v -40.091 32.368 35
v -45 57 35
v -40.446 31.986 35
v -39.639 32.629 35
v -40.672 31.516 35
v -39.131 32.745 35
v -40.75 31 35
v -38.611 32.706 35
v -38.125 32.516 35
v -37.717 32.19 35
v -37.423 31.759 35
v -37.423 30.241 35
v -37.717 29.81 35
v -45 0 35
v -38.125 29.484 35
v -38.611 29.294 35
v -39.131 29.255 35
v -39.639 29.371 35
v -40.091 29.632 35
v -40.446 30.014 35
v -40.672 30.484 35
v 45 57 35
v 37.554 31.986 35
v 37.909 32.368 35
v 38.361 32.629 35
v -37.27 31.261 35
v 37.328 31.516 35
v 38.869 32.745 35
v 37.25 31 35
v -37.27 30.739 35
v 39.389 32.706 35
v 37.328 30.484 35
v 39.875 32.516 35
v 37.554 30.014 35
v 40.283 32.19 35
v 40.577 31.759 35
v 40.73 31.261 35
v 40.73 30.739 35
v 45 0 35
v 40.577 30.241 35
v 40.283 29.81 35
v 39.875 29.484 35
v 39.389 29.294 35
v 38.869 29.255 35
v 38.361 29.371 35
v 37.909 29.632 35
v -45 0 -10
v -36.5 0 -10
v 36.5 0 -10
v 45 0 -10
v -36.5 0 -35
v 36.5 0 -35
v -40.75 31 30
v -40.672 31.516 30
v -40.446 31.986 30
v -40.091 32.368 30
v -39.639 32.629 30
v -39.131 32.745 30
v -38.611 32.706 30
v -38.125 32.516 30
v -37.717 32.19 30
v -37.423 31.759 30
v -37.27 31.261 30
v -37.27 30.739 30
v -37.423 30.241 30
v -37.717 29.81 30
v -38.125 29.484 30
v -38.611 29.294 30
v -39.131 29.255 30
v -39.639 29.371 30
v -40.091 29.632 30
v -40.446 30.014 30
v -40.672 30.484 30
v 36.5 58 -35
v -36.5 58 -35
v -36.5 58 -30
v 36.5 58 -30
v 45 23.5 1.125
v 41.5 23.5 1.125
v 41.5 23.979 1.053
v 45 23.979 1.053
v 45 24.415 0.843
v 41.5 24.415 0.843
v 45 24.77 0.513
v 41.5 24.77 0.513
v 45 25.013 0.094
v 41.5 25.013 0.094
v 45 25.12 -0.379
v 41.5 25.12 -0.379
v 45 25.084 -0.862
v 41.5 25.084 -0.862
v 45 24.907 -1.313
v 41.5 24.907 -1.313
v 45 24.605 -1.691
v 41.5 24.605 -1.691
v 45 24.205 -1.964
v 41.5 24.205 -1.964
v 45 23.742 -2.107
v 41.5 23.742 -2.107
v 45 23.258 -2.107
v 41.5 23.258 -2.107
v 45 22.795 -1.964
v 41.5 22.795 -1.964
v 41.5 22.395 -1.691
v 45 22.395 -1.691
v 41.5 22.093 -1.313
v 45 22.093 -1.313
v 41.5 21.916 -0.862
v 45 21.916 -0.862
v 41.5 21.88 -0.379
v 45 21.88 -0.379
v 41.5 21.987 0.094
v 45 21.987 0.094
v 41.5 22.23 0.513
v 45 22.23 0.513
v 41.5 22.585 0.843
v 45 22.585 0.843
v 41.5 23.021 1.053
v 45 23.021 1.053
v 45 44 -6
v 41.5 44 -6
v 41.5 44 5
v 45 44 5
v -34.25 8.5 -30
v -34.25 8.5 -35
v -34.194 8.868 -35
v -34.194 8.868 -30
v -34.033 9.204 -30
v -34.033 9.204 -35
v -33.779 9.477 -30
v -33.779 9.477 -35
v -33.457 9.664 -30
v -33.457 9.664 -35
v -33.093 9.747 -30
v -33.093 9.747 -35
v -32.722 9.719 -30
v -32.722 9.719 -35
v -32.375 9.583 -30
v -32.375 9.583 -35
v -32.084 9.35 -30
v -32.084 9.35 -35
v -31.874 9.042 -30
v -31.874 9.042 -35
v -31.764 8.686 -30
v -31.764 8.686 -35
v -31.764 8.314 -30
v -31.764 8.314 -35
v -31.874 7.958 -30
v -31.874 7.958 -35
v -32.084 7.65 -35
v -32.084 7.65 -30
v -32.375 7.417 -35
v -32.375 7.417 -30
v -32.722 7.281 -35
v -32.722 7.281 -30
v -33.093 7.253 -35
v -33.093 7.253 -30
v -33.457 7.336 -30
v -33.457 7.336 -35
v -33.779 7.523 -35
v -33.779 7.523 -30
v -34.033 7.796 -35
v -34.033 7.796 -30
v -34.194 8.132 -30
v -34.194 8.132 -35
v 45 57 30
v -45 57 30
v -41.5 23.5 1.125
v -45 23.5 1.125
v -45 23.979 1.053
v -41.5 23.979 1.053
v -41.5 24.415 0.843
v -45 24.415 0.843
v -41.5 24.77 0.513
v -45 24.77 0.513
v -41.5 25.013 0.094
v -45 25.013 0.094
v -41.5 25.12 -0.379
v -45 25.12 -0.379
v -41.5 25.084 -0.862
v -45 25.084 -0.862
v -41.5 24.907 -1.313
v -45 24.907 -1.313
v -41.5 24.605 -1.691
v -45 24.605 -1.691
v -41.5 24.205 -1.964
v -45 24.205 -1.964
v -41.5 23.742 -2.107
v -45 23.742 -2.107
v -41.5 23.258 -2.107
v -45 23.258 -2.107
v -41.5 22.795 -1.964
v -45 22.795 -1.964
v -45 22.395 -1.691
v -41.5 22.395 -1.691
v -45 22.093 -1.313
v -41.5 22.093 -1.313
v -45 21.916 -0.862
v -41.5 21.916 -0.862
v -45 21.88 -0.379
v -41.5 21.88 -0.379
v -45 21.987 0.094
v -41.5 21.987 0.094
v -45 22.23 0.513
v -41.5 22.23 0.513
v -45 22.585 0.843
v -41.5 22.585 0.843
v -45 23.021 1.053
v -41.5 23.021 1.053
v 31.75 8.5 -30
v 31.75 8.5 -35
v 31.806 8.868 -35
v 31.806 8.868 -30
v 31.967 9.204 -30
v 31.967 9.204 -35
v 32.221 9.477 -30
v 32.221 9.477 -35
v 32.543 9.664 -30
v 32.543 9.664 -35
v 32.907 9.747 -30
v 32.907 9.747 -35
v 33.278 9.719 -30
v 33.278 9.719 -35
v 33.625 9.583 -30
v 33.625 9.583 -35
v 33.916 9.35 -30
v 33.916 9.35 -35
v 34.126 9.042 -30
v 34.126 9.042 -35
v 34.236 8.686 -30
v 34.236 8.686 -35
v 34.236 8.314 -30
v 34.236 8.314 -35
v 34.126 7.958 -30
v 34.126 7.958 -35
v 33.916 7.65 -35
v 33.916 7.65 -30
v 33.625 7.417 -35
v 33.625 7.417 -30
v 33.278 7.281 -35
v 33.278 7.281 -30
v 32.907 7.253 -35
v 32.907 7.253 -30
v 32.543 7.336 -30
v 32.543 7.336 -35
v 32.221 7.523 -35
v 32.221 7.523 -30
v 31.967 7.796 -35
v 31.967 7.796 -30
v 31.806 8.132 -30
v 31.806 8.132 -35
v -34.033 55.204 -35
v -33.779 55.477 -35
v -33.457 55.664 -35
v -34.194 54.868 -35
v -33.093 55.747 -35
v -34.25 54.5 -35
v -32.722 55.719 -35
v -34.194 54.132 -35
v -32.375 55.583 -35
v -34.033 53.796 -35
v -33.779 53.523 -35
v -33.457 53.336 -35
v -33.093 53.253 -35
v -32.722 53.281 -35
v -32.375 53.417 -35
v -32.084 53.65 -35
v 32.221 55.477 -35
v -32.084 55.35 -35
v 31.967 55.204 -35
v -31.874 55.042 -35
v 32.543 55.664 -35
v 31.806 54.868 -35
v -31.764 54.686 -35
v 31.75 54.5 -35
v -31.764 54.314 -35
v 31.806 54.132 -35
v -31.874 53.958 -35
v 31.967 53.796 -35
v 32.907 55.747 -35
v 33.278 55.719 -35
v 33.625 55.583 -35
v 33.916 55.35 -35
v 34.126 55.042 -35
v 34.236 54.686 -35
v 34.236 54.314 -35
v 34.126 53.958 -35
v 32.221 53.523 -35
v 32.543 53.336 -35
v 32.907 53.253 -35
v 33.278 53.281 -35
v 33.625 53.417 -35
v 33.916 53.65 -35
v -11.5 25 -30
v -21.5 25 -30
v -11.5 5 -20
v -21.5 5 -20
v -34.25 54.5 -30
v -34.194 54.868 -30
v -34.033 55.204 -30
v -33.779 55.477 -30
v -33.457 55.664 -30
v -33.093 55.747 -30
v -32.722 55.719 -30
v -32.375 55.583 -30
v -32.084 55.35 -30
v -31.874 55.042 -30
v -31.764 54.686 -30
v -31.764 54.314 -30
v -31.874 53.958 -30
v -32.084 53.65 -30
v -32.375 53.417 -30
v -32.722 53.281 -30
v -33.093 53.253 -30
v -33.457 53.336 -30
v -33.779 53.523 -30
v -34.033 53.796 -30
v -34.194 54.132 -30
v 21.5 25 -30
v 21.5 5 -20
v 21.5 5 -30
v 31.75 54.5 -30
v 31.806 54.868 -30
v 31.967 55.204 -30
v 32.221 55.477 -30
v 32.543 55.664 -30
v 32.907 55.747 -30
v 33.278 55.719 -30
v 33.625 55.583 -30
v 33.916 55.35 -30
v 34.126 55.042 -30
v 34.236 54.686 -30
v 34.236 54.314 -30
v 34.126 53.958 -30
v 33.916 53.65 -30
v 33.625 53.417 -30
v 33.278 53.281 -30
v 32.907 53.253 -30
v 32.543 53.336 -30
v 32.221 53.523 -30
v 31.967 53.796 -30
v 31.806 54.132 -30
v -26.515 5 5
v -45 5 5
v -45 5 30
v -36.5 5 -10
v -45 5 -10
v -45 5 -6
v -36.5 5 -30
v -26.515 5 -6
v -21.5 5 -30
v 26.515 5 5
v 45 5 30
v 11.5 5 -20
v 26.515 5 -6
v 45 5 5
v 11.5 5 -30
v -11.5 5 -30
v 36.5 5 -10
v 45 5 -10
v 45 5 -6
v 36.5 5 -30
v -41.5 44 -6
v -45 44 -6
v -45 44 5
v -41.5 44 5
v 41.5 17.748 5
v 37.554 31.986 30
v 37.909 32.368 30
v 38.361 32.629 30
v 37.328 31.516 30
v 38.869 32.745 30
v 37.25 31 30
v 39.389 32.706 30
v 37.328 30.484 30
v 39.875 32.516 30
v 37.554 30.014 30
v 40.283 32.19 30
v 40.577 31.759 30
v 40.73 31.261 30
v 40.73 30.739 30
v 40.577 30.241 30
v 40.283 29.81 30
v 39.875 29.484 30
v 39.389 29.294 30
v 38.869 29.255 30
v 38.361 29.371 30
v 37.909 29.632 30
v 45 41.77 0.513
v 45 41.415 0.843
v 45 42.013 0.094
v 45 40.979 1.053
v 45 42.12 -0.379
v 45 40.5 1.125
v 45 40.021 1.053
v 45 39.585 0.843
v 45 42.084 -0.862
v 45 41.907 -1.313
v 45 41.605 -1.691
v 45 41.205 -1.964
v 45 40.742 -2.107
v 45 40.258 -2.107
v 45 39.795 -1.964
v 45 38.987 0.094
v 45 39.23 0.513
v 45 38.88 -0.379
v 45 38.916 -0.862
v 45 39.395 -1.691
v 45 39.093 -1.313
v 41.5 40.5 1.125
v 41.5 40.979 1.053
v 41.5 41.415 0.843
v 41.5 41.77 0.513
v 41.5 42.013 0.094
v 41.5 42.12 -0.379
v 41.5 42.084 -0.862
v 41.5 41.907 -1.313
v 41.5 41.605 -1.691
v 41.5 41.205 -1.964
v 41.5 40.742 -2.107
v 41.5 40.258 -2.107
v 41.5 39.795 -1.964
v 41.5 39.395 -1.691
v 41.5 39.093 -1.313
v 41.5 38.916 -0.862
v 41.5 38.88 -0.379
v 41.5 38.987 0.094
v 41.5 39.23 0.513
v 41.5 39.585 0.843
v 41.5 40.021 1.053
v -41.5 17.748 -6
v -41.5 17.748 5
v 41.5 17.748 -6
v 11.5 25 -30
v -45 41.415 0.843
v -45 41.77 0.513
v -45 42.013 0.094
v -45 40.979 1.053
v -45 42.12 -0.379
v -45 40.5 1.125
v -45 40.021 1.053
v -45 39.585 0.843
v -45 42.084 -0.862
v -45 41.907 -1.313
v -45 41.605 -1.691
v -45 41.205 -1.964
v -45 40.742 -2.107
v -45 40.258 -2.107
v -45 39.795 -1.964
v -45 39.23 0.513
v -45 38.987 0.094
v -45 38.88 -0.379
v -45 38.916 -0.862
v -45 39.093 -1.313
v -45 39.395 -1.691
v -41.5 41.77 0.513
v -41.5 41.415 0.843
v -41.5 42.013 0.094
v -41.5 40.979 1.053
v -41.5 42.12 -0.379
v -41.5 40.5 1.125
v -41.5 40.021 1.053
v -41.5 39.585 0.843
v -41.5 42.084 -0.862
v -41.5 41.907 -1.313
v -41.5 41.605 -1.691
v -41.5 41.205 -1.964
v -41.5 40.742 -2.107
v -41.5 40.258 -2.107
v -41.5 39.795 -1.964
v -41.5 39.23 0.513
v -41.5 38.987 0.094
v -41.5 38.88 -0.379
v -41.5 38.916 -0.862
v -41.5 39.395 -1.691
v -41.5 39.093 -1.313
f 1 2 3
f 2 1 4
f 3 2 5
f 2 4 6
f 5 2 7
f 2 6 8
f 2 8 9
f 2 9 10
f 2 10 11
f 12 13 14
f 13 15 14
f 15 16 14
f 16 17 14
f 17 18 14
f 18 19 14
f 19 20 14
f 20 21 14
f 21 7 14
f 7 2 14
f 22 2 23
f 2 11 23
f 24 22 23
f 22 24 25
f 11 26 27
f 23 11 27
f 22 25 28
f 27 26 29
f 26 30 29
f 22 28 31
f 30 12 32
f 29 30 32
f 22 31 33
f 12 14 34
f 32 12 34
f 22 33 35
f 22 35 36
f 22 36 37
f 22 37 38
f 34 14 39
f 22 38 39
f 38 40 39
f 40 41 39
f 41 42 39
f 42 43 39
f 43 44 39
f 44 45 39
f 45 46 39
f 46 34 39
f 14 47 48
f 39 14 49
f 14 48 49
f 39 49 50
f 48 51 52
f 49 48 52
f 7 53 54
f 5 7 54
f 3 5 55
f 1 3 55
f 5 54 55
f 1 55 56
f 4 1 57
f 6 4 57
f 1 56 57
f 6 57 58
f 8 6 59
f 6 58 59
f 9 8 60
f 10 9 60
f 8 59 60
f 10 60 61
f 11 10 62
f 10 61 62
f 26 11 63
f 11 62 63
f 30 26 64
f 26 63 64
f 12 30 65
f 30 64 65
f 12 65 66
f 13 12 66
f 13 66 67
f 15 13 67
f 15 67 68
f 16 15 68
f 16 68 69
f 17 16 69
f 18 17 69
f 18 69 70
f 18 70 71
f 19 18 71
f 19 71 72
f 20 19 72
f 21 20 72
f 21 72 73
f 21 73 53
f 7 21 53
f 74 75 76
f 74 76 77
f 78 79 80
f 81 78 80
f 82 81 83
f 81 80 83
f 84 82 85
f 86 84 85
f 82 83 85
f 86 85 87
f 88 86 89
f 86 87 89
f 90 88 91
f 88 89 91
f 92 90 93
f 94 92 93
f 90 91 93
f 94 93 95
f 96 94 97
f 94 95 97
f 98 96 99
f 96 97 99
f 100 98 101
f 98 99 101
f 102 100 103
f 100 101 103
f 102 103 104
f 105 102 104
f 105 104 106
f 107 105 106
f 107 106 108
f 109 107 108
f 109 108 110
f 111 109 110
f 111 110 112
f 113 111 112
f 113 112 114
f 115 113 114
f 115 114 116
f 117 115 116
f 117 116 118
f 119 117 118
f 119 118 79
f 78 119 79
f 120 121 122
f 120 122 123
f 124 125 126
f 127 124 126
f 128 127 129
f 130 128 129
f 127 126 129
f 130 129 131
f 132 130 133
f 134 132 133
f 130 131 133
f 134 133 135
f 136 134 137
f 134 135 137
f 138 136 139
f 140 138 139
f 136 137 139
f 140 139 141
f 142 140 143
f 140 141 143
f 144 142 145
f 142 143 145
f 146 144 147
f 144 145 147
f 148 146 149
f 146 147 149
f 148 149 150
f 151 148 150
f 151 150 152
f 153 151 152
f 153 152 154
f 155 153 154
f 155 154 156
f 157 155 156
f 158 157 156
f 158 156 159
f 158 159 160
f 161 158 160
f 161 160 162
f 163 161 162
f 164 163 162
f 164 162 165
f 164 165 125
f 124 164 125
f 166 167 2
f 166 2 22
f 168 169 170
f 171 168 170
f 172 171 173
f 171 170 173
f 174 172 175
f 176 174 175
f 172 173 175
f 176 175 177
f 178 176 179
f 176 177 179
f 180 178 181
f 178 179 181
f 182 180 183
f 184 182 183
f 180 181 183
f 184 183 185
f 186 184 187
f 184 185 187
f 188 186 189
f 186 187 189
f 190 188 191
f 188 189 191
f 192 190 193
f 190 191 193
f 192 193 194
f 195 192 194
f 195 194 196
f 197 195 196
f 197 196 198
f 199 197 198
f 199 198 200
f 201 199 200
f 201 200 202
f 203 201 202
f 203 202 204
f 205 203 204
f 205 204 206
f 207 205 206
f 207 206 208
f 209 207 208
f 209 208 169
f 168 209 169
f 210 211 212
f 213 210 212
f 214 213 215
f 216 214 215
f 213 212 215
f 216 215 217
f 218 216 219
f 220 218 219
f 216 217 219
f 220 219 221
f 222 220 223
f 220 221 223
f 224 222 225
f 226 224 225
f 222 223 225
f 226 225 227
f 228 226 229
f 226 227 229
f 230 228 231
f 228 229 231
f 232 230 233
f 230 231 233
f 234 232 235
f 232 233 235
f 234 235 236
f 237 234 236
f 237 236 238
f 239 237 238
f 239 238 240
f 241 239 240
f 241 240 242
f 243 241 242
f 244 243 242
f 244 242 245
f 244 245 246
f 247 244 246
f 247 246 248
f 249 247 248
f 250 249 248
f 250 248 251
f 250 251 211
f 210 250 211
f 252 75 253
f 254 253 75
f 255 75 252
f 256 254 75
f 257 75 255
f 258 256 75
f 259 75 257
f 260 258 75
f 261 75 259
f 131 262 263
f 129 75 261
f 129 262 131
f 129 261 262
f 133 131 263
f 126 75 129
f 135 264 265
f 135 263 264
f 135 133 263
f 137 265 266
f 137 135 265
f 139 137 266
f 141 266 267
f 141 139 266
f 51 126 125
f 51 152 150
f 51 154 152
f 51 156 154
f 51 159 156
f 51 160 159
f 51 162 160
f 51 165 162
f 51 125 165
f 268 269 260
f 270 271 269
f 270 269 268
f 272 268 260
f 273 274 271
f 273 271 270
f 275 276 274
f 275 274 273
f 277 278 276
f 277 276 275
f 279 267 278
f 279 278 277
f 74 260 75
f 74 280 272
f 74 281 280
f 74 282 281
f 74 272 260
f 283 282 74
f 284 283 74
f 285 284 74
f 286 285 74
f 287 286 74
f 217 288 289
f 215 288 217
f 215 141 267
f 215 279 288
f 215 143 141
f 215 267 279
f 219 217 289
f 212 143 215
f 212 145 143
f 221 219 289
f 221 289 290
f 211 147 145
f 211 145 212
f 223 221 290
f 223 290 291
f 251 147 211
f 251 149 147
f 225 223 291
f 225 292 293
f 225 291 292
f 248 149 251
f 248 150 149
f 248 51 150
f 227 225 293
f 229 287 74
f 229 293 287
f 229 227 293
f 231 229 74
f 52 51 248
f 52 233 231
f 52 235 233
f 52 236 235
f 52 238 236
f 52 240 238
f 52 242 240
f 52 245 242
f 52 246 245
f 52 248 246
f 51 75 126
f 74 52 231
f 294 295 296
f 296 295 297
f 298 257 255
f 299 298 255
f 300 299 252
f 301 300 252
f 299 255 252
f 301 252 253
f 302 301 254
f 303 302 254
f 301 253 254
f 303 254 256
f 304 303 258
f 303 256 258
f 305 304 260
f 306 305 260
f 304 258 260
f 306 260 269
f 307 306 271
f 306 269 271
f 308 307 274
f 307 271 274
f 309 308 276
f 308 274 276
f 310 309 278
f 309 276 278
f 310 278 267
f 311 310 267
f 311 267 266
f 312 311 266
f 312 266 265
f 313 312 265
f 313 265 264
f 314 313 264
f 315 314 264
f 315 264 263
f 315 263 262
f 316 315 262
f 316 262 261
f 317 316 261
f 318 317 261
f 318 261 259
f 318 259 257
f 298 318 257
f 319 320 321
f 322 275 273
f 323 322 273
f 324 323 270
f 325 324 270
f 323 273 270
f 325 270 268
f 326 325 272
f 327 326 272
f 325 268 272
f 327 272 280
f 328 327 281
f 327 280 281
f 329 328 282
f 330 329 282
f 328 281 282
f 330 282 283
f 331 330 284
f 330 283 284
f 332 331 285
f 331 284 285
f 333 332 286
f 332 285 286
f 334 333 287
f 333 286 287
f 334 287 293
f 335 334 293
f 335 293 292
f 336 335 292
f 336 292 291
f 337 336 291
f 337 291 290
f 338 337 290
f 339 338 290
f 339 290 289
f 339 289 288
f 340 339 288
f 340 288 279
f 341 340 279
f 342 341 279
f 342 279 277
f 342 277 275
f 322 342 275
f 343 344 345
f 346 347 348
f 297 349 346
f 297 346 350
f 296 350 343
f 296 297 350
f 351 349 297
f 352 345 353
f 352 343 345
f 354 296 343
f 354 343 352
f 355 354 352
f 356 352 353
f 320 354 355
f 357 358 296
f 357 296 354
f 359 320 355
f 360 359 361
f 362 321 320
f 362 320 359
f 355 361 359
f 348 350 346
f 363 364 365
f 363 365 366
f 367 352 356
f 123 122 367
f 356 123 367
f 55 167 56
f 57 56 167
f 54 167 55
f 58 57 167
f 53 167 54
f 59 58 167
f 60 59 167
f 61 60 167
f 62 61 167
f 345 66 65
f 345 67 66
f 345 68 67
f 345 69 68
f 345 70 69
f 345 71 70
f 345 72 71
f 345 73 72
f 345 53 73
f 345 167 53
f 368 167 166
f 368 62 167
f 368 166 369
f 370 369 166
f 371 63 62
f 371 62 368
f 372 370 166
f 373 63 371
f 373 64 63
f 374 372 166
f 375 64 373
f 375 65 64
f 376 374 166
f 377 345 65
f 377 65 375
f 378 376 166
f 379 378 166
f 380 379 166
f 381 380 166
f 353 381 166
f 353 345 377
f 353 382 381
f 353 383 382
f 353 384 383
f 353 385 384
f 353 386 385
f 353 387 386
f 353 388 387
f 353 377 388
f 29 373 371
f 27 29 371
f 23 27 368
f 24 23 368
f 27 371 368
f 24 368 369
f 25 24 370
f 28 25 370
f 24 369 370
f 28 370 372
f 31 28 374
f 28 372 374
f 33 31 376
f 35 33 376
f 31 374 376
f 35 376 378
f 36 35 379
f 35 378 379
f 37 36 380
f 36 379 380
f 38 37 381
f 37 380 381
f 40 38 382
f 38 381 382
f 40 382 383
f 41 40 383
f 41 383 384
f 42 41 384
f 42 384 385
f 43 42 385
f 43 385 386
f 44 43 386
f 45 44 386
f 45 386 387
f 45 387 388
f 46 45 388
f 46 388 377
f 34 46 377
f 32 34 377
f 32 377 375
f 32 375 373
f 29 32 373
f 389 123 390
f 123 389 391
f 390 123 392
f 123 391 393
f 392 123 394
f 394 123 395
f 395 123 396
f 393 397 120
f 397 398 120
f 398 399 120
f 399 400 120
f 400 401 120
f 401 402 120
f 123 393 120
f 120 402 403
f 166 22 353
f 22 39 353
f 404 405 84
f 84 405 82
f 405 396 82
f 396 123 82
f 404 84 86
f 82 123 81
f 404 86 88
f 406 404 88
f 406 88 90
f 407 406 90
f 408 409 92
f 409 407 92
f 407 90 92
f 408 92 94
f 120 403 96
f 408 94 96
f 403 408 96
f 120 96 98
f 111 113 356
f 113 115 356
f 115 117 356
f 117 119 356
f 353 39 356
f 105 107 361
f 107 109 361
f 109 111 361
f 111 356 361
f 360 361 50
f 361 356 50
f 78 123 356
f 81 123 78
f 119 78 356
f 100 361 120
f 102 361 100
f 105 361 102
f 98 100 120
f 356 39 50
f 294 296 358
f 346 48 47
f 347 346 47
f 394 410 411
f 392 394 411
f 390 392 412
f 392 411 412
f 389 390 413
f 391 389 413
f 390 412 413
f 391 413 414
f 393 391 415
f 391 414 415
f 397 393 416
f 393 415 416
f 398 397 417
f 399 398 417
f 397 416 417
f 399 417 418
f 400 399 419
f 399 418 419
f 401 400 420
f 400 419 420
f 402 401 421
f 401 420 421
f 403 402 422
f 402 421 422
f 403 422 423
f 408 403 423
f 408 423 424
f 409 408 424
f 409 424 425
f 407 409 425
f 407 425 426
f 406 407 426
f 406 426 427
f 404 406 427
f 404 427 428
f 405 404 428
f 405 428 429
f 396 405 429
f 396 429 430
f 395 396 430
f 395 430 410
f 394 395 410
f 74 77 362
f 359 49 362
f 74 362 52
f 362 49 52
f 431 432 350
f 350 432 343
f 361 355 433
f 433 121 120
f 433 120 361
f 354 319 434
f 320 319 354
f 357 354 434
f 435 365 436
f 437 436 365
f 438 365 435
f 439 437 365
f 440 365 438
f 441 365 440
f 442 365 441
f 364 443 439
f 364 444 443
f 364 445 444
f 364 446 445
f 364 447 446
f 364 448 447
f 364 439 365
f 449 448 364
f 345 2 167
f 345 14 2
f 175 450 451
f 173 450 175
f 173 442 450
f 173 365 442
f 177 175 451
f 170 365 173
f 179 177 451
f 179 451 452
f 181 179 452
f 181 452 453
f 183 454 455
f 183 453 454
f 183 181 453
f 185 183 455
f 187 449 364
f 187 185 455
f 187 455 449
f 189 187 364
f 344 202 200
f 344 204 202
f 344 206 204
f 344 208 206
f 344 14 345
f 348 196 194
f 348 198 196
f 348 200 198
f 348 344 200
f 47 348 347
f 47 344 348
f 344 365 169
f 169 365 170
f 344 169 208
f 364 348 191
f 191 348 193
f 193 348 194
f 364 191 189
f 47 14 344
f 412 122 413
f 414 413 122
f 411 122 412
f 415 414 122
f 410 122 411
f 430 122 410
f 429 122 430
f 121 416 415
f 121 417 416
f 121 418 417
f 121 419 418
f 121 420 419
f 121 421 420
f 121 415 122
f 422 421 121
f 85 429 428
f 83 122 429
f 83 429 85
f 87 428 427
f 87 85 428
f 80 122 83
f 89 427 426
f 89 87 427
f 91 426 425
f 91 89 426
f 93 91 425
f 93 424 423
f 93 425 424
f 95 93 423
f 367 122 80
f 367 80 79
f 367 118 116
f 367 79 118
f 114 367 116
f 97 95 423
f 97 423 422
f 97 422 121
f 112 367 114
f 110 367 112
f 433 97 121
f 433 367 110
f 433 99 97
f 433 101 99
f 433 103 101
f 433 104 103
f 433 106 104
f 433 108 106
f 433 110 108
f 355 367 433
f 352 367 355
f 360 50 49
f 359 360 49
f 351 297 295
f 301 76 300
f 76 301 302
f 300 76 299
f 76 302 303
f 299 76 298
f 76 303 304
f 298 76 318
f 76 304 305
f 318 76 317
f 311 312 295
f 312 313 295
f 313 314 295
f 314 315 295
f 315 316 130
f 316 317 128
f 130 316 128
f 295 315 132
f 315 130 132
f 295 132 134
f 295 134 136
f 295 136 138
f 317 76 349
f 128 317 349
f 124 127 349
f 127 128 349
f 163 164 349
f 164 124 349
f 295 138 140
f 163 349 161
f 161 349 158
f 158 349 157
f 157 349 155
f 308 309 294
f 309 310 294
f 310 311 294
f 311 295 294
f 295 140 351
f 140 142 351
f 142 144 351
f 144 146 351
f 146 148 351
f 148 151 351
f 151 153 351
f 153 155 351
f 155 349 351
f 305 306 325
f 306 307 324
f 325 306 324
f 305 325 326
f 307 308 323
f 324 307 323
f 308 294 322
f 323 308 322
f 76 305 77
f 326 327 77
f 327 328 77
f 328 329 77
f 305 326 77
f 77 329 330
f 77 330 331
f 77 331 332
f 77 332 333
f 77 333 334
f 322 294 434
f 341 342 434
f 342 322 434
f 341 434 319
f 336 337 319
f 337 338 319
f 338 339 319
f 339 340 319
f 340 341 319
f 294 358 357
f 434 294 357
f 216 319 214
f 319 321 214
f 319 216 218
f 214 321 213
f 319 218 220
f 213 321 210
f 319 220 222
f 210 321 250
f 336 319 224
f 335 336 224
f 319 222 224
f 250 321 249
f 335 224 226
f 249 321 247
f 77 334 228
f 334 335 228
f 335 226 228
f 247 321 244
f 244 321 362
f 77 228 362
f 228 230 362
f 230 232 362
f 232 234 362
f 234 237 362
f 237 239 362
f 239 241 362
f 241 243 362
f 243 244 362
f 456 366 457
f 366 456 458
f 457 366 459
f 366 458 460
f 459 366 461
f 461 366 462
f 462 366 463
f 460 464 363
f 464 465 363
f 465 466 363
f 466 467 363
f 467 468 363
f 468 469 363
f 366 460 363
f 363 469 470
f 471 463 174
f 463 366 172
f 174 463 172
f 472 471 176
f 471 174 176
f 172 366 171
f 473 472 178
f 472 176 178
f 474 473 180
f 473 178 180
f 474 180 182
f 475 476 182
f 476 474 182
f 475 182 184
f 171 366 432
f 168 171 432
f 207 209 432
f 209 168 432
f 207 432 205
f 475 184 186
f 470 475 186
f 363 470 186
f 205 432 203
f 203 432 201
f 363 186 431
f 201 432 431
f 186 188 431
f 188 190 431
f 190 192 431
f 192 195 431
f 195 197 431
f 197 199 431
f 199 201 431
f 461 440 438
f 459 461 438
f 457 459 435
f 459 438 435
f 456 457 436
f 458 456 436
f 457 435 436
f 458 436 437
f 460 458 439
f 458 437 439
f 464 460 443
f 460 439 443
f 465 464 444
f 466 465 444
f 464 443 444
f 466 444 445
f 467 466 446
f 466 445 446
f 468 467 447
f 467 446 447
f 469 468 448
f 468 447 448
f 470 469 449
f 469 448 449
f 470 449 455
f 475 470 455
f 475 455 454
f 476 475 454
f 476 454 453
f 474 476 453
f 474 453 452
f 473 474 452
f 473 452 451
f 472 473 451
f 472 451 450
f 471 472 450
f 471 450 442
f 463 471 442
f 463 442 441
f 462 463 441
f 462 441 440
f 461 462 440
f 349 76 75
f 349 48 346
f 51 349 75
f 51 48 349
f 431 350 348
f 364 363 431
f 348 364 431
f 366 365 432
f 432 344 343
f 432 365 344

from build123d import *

# Parameters (mm, degrees)
ESTRUSIONE_ESTRUSIONE1_DEPTH = 5
SCHIZZO2_W                   = 73
SCHIZZO2_H                   = 5
ESTRUSIONE_ESTRUSIONE2_DEPTH = 53
SCHIZZO4_R                   = 1.25
TAGLIO_ESTRUSIONE1_DEPTH     = 10
SCHIZZO1_3_W                 = 3.5
SCHIZZO1_3_H                 = 11
ESTRUSIONE_ESTRUSIONE3_DEPTH = 44
SCHIZZO5_R                   = 1.625
TAGLIO_ESTRUSIONE2_DEPTH     = 113.645461515
SCHIZZO2_3_W                 = 90
SCHIZZO2_3_H                 = 5
ESTRUSIONE_ESTRUSIONE4_DEPTH = 52
SCHIZZO8_R                   = 1.75
TAGLIO_ESTRUSIONE3_DEPTH     = 99.051007134
ESTRUSIONE_ESTRUSIONE5_DEPTH = 11
ESTRUSIONE_ESTRUSIONE6_DEPTH = 5


with BuildPart() as part:
    # Schizzo1 → Estrusione-Estrusione1 (new body)
    with BuildSketch(Plane(origin=(0, 0, 0), x_dir=(1, 0, 0), z_dir=(0, 1, 0))):
        Polygon((45, 10), (36.5, 10), (36.5, 35), (-36.5, 35), (-36.5, 10), (-45, 10), (-45, 6), (-41.5, 6), (-41.5, -5), (-45, -5), (-45, -35), (45, -35), (45, -5), (41.5, -5), (41.5, 6), (45, 6), align=None)
    extrude(amount=ESTRUSIONE_ESTRUSIONE1_DEPTH)

    # Schizzo2 → Estrusione-Estrusione2 (add)
    with BuildSketch(Plane(origin=(0, 5, 0), x_dir=(1, 0, 0), z_dir=(0, 1, 0))):
        with Locations((0, 32.5)):
            Rectangle(SCHIZZO2_W, SCHIZZO2_H)
    extrude(amount=ESTRUSIONE_ESTRUSIONE2_DEPTH)

    # Schizzo4 → Taglio-Estrusione1 (cut)
    with BuildSketch(Plane(origin=(0, 0, -35), x_dir=(-1, 0, 0), z_dir=(0, 0, -1))):
        with Locations((-33, 54.5)):
            Circle(SCHIZZO4_R)
        with Locations((33, 54.5)):
            Circle(SCHIZZO4_R)
        with Locations((33, 8.5)):
            Circle(SCHIZZO4_R)
        with Locations((-33, 8.5)):
            Circle(SCHIZZO4_R)
    extrude(amount=-TAGLIO_ESTRUSIONE1_DEPTH, mode=Mode.SUBTRACT)

    # Schizzo1<3> → Estrusione-Estrusione3 (add)
    with BuildSketch(Plane(origin=(0, 0, 0), x_dir=(1, 0, 0), z_dir=(0, 1, 0))):
        with Locations((43.25, 0.5)):
            Rectangle(SCHIZZO1_3_W, SCHIZZO1_3_H)
        with Locations((-43.25, 0.5)):
            Rectangle(SCHIZZO1_3_W, SCHIZZO1_3_H)
    extrude(amount=ESTRUSIONE_ESTRUSIONE3_DEPTH)

    # Schizzo5 → Taglio-Estrusione2 (cut, through all)
    with BuildSketch(Plane.ZY.offset(45)):
        with Locations((-0.5, 40.5)):
            Circle(SCHIZZO5_R)
        with Locations((-0.5, 23.5)):
            Circle(SCHIZZO5_R)
    extrude(amount=-TAGLIO_ESTRUSIONE2_DEPTH, mode=Mode.SUBTRACT)

    # Schizzo2<3> → Estrusione-Estrusione4 (add)
    with BuildSketch(Plane(origin=(0, 5, 0), x_dir=(1, 0, 0), z_dir=(0, 1, 0))):
        with Locations((0, -32.5)):
            Rectangle(SCHIZZO2_3_W, SCHIZZO2_3_H)
    extrude(amount=ESTRUSIONE_ESTRUSIONE4_DEPTH)

    # Schizzo8 → Taglio-Estrusione3 (cut, through all)
    with BuildSketch(Plane(origin=(0, 0, 30), x_dir=(-1, 0, 0), z_dir=(0, 0, -1))):
        with Locations((-39, 31)):
            Circle(SCHIZZO8_R)
        with Locations((39, 31)):
            Circle(SCHIZZO8_R)
    extrude(amount=-TAGLIO_ESTRUSIONE3_DEPTH, mode=Mode.SUBTRACT)

    # Schizzo11 → Estrusione-Estrusione5 (add)
    with BuildSketch(Plane.XY.offset(5)):
        Polygon((-41.5, 17.747952022), (-41.5, 5), (-26.515389788, 5), align=None)
        Polygon((41.5, 5), (41.5, 17.747952022), (26.515389788, 5), align=None)
    extrude(amount=-ESTRUSIONE_ESTRUSIONE5_DEPTH)

    # Schizzo13 → Estrusione-Estrusione6 (add, symmetric)
    with BuildSketch(Plane.ZY.offset(16.5)):
        Polygon((-30, 25), (-20, 5), (-30, 5), align=None)
    estrusione_estrusione6 = extrude(amount=ESTRUSIONE_ESTRUSIONE6_DEPTH, both=True)

    # Specchia1: Estrusione-Estrusione6 across plane
    add(estrusione_estrusione6.mirror(Plane(origin=(0, 0, 0), x_dir=(0, 0, 1), z_dir=(1, 0, 0))))


solid = part.part
